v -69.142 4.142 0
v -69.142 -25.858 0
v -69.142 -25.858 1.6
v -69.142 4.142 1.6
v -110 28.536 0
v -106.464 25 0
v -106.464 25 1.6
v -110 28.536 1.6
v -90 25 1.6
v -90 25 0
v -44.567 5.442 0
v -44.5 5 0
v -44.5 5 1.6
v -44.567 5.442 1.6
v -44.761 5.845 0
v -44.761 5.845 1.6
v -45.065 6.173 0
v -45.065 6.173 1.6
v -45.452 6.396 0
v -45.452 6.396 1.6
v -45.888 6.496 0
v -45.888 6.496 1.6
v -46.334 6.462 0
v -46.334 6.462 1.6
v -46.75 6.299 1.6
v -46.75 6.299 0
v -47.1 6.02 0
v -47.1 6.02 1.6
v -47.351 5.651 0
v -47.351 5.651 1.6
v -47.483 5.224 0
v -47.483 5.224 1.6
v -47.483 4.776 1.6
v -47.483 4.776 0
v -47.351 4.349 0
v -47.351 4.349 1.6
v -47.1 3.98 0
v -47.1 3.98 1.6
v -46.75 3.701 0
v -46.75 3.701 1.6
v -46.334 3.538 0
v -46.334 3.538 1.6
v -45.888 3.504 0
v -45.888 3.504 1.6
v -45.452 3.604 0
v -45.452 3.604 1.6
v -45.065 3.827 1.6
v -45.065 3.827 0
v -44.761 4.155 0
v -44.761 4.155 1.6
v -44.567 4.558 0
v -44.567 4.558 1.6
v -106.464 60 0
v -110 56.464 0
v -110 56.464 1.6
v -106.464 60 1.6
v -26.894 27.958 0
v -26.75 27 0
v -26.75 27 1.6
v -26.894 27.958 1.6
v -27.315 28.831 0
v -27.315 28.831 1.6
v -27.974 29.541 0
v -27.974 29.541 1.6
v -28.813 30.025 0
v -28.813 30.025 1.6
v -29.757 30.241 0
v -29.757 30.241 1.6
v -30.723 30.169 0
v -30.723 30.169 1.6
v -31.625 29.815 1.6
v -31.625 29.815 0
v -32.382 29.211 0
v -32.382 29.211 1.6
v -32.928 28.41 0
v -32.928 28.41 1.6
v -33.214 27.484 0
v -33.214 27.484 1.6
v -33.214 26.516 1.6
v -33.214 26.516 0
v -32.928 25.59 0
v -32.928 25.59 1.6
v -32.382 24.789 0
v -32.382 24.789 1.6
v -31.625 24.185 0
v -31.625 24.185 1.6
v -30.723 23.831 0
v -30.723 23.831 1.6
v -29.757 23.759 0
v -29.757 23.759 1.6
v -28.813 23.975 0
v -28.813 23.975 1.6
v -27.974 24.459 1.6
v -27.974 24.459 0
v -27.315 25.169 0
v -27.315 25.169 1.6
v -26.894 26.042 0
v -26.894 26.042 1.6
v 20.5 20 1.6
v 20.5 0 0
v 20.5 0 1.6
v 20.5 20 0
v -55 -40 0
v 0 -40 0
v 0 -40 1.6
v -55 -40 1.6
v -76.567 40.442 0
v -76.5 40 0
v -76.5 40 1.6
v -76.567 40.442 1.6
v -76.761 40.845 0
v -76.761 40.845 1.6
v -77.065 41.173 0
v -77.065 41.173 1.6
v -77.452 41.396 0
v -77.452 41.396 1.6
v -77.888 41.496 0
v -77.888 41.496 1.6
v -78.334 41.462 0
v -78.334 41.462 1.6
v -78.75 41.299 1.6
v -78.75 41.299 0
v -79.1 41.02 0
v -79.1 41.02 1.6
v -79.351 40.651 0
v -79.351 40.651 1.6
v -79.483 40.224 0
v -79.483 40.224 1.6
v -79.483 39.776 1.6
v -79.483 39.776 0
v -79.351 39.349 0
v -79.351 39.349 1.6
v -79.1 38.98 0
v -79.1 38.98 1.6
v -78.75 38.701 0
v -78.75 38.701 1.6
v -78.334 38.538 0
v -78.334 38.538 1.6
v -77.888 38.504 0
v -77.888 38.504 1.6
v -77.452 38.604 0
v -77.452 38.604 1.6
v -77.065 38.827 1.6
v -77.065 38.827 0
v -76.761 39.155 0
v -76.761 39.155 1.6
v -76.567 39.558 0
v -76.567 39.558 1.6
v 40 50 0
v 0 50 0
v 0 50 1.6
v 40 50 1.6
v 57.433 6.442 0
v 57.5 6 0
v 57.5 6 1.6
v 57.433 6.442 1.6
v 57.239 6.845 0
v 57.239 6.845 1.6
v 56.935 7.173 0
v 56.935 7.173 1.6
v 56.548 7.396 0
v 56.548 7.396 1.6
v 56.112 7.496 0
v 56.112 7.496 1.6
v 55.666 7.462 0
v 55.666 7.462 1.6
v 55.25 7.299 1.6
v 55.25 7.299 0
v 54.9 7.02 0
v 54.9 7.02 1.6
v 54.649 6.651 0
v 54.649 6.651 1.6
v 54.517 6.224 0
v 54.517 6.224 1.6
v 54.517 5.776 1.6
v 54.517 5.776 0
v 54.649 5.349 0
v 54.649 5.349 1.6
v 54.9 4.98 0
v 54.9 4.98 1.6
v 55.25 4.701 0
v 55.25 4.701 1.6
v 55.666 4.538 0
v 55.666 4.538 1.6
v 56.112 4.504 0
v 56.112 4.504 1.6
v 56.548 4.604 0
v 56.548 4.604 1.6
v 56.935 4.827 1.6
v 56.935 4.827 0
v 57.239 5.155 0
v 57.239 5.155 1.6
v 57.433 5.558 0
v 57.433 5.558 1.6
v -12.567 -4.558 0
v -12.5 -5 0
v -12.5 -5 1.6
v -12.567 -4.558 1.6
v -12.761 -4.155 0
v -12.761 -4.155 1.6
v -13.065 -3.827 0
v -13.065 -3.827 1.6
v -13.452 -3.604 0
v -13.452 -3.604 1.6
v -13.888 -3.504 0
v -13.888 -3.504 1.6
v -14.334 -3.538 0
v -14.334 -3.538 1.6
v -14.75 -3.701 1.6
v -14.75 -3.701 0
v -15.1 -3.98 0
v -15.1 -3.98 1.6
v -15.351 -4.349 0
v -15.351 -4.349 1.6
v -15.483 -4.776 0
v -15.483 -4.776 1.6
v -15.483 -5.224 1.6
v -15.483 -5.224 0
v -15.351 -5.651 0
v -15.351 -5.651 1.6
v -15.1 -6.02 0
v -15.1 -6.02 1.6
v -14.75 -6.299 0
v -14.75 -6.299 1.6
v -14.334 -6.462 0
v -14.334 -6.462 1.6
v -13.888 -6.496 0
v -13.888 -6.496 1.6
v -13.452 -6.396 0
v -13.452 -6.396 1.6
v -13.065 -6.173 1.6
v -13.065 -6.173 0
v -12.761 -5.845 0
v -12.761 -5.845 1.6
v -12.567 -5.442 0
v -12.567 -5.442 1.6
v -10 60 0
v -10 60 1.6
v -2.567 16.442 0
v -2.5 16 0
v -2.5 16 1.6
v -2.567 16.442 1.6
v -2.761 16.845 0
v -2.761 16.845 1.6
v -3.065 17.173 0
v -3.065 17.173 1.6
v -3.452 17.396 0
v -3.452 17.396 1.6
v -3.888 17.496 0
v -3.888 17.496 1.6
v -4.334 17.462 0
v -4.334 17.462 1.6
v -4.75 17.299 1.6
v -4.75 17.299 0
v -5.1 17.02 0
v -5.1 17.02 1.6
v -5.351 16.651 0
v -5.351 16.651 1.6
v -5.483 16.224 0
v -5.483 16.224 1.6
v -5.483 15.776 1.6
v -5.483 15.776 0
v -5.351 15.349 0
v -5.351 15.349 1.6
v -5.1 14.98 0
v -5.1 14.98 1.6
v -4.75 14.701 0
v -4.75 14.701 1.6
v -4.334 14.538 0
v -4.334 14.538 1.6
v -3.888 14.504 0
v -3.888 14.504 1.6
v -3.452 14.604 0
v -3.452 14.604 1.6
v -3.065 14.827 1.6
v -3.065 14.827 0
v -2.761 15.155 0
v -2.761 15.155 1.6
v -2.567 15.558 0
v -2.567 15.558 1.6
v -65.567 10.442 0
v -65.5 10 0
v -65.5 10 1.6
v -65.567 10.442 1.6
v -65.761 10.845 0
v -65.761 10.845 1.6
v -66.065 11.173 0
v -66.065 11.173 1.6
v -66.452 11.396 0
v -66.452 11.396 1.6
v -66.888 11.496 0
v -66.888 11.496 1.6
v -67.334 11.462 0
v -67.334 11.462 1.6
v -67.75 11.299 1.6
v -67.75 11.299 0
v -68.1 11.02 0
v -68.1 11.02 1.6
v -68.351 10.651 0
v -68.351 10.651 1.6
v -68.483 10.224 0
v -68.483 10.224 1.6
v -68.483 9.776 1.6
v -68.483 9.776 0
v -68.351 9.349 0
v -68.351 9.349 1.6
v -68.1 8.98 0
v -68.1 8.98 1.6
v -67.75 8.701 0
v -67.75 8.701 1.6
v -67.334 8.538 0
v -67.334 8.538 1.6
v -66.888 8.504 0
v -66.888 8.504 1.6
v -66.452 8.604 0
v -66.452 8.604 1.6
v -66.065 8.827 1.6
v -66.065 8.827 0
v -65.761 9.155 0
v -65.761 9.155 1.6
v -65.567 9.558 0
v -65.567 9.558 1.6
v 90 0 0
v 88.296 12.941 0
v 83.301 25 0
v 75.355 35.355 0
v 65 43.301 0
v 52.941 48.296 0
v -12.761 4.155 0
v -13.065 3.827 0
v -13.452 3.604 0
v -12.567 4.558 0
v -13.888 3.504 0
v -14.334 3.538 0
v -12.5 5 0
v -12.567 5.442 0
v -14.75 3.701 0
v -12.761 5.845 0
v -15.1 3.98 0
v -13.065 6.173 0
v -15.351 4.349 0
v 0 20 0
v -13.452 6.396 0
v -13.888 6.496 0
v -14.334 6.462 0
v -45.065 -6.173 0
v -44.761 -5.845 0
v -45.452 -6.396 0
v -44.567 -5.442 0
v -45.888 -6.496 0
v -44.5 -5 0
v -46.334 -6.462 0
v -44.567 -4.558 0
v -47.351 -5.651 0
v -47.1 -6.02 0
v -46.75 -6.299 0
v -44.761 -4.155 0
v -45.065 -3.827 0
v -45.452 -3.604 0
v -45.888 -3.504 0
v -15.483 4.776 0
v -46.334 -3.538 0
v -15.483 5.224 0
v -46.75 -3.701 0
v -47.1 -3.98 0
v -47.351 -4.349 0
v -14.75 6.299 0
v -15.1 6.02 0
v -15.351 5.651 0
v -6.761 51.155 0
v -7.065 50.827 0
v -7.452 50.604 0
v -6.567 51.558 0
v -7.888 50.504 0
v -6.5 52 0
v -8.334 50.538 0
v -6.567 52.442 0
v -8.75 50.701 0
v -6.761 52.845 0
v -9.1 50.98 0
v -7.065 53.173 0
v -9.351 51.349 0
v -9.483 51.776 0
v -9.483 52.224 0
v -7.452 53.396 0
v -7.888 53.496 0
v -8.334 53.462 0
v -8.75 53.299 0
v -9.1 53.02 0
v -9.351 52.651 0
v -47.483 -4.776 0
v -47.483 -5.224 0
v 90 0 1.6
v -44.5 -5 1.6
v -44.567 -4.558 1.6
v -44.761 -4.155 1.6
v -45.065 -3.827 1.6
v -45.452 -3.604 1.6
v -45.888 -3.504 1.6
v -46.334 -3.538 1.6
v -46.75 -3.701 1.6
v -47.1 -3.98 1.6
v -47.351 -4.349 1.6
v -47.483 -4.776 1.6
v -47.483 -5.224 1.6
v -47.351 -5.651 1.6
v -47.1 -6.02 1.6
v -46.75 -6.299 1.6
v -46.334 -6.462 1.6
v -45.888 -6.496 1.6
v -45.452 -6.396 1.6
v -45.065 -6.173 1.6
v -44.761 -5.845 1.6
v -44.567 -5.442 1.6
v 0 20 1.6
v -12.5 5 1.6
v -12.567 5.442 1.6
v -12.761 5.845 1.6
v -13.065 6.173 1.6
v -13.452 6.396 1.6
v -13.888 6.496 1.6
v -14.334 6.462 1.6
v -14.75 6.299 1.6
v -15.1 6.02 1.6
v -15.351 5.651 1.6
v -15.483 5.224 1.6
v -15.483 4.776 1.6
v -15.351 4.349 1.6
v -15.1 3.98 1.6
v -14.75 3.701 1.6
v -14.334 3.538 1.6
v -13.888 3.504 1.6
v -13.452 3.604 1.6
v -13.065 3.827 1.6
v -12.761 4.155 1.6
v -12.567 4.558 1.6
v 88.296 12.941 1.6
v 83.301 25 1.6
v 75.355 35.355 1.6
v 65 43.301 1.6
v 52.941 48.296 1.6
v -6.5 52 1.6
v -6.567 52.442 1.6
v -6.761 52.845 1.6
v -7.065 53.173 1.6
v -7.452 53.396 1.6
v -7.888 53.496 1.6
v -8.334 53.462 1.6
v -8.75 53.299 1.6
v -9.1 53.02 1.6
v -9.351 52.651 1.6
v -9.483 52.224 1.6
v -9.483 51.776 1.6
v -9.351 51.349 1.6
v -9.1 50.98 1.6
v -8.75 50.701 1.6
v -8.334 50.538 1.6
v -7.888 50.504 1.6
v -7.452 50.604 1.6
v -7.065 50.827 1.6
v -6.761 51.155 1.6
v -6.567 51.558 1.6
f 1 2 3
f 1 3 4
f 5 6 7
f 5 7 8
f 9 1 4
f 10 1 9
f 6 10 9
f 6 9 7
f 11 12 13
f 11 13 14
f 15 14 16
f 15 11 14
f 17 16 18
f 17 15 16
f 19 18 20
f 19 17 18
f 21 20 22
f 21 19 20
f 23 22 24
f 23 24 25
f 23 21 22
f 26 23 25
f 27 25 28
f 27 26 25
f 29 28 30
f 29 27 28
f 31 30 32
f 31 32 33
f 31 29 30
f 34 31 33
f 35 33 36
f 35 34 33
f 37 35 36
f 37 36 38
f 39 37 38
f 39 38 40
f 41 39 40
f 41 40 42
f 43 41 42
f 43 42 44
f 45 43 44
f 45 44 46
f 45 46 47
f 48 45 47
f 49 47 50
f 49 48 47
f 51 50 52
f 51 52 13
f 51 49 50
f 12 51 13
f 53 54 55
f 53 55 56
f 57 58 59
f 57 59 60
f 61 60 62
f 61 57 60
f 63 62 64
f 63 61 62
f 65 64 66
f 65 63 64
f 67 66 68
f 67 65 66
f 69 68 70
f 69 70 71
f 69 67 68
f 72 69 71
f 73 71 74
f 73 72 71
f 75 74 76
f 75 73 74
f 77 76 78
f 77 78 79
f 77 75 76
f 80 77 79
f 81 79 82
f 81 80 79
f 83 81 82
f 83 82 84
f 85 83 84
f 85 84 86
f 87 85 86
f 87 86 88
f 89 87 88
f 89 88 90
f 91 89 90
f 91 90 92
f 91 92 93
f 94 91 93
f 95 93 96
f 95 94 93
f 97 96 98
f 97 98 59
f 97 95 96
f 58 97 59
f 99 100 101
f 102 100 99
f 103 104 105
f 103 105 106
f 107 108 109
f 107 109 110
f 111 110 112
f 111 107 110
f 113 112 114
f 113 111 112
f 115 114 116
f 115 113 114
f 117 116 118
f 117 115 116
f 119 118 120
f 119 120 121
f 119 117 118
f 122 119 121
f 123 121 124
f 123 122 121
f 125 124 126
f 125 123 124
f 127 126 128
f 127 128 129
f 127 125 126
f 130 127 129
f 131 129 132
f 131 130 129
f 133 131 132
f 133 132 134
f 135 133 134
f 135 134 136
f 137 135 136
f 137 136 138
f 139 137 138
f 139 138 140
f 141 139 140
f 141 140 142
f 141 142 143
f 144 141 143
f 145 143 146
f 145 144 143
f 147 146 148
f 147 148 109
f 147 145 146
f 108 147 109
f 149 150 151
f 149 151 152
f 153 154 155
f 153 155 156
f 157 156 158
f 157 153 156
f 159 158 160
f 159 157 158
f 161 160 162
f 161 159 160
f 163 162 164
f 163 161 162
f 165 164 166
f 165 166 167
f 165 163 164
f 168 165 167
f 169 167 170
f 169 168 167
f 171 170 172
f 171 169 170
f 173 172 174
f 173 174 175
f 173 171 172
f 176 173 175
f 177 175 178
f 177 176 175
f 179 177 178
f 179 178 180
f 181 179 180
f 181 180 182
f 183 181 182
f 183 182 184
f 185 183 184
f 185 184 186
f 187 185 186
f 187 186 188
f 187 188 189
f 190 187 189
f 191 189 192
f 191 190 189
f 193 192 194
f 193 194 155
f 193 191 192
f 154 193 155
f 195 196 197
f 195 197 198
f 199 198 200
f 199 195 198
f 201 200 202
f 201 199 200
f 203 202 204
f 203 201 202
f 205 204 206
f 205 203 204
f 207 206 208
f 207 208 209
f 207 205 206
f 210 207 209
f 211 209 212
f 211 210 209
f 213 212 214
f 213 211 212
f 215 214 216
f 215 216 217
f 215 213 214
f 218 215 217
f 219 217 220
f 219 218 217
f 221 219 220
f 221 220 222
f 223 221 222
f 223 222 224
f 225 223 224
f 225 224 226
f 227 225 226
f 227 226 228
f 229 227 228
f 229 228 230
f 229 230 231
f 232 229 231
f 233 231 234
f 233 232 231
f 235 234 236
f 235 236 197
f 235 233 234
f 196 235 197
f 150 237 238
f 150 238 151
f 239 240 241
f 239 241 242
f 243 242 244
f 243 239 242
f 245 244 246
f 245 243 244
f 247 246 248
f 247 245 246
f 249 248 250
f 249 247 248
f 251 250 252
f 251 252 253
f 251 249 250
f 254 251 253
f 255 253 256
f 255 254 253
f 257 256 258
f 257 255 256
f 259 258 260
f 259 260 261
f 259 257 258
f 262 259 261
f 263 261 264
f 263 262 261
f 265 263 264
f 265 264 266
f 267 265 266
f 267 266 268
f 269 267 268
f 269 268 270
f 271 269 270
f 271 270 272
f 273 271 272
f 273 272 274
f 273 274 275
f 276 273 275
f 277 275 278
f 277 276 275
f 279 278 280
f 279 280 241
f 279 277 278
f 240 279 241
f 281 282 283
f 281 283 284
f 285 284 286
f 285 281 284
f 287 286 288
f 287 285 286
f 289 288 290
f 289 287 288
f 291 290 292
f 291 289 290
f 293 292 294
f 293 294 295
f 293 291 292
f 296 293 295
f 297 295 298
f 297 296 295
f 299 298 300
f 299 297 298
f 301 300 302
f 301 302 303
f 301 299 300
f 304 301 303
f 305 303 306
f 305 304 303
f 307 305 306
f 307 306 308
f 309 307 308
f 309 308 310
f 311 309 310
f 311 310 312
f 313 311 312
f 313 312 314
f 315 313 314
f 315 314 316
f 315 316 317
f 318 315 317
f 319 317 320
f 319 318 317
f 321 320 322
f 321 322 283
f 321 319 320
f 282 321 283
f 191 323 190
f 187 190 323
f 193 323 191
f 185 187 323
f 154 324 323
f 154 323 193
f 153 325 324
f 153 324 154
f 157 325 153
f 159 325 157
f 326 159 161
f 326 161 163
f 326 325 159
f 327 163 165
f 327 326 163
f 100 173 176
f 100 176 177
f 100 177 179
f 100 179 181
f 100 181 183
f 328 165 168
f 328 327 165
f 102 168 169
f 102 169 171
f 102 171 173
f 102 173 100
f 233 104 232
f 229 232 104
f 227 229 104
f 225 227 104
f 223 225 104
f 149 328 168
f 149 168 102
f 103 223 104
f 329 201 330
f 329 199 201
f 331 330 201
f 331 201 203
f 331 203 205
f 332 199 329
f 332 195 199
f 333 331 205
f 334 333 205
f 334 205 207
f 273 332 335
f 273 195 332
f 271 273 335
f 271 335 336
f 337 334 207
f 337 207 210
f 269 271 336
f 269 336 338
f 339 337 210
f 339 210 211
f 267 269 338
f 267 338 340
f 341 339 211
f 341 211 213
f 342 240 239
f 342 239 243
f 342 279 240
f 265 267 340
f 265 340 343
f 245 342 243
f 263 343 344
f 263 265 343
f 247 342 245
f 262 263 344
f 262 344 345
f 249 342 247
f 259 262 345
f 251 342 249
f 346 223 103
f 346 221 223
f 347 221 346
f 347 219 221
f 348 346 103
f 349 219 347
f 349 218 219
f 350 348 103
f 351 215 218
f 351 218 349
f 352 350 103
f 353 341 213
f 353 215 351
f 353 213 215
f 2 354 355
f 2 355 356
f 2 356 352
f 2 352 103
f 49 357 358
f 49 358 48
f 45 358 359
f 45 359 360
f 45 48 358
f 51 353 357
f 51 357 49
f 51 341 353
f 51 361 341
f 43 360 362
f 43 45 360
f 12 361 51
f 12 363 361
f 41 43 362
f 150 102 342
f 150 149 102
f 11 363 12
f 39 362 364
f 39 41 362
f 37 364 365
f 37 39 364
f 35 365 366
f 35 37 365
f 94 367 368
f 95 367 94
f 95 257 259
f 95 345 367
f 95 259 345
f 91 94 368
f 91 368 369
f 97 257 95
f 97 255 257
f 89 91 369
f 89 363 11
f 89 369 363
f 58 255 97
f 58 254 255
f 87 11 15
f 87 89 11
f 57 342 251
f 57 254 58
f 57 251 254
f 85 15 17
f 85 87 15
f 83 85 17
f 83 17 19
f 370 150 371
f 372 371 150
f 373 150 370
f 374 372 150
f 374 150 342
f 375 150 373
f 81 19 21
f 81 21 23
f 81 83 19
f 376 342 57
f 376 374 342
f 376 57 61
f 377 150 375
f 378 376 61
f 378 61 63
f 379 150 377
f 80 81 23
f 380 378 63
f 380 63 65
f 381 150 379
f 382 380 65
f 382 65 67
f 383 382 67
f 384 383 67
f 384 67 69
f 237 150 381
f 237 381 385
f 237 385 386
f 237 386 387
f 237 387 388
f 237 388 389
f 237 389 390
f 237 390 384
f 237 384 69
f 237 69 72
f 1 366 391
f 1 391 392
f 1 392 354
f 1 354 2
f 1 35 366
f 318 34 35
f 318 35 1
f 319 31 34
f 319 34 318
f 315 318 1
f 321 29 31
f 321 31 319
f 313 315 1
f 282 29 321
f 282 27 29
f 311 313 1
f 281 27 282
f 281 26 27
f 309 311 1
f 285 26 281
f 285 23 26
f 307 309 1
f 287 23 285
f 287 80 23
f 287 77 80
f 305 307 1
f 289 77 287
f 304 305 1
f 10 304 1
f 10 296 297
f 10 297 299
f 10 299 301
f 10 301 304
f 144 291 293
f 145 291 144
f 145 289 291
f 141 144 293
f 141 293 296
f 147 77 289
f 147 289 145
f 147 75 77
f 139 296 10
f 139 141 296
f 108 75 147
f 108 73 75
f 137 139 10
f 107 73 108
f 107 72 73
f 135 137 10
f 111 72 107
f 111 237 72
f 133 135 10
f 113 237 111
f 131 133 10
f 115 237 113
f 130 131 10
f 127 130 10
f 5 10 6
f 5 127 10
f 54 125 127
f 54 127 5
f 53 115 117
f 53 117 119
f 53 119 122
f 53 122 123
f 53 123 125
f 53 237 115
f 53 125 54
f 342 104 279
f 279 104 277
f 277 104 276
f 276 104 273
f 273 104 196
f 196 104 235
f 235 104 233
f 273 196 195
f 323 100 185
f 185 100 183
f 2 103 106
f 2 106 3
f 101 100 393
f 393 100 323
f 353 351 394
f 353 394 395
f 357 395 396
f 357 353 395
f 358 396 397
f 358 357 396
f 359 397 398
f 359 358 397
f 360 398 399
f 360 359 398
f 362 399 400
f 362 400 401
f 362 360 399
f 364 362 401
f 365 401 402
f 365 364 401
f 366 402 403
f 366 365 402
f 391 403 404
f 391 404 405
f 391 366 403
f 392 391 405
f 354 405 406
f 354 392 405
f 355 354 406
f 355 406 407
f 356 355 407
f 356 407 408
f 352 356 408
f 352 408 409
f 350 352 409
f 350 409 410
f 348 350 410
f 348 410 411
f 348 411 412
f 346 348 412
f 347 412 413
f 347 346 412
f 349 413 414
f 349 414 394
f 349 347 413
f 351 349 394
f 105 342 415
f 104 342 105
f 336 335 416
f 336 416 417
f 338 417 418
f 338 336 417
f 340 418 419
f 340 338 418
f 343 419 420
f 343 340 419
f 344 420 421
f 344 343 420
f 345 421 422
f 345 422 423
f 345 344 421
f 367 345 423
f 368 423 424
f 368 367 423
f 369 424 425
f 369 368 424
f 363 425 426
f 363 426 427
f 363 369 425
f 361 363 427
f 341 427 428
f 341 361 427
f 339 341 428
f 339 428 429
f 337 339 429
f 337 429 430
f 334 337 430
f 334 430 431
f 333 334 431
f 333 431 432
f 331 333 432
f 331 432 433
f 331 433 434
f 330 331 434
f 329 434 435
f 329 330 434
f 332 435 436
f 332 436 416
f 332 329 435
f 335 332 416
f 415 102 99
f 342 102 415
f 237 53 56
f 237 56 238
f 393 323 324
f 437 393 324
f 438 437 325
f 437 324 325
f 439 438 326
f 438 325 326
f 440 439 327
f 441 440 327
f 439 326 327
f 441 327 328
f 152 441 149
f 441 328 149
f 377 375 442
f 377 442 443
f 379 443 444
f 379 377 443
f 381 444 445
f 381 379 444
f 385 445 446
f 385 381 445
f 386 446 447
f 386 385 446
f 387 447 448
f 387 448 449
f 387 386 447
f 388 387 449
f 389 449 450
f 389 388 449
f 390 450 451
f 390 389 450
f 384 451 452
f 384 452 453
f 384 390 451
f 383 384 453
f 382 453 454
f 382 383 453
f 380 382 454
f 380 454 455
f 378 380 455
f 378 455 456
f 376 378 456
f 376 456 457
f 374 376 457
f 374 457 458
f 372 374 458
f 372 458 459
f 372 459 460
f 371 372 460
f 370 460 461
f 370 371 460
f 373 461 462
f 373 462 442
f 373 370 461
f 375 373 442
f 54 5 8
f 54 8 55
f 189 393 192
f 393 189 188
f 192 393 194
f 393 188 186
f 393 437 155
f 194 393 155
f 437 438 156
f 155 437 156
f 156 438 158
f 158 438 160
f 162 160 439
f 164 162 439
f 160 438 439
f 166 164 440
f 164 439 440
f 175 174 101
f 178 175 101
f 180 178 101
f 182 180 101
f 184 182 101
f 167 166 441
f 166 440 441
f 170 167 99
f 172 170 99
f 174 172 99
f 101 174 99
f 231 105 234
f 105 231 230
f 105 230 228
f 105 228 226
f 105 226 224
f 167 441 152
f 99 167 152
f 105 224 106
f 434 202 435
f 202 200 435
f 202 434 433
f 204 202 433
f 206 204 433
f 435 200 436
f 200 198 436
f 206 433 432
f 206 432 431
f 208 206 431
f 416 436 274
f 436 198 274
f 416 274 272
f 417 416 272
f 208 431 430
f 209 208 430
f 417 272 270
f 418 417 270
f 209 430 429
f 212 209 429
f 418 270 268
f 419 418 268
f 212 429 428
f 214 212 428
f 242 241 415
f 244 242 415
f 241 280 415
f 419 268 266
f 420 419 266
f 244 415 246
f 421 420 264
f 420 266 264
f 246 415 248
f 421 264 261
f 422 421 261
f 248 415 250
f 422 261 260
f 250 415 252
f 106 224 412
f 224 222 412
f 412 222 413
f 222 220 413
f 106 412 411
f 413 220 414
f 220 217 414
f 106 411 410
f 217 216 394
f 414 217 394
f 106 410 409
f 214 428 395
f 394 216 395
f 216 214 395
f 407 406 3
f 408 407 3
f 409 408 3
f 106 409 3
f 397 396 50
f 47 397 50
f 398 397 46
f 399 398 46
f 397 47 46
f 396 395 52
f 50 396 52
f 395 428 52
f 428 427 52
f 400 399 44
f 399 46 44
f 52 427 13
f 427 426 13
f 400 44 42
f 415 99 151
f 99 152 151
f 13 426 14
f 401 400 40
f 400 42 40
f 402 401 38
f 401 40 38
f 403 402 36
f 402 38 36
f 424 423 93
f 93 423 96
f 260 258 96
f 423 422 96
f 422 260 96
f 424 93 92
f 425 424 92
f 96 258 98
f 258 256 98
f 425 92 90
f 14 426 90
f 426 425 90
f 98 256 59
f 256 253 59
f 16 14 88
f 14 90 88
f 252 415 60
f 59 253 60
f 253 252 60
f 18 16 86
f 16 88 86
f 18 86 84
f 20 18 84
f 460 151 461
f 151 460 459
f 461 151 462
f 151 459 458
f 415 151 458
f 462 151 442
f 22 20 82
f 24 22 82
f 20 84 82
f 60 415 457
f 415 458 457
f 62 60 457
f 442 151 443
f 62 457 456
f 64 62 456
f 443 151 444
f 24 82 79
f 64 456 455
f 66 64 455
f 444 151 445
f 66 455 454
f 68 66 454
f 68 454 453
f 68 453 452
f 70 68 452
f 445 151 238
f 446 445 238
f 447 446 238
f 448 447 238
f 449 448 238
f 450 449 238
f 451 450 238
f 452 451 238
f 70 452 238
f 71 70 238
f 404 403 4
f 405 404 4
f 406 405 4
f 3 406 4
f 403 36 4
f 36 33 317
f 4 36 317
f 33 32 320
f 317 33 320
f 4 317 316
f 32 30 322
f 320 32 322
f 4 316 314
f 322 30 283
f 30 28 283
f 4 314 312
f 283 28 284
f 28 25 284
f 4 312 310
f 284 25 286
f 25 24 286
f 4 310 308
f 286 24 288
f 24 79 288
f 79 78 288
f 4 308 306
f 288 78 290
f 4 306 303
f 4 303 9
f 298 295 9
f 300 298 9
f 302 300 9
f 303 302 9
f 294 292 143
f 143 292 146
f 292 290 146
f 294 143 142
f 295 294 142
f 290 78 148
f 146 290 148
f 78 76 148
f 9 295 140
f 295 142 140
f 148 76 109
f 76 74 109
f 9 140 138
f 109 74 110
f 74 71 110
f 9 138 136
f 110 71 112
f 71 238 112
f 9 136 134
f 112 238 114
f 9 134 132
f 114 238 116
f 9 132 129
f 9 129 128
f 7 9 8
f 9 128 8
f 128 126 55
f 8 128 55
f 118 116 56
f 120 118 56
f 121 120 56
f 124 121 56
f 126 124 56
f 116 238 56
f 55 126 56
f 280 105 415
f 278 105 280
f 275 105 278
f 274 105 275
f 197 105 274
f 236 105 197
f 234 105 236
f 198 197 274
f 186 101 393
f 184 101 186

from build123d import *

# Parameters (mm, degrees)
SKETCH_R   = 1.5
SKETCH_R_2 = 3.25
PAD_DEPTH  = 1.6


with BuildPart() as part:
    # Sketch → Pad (new body)
    with BuildSketch(Plane.XY):
        with BuildLine():
            Line((20.5, 0), (20.5, 20))
            Line((20.5, 20), (0, 20))
            Line((0, 20), (0, -40))
            Line((0, -40), (-55, -40))
            Line((-55, -40), (-69.142136, -25.857864))
            Line((-69.142136, -25.857864), (-69.142136, 4.142136))
            Line((-69.142136, 4.142136), (-90, 25))
            Line((-90, 25), (-106.464466, 25))
            Line((-106.464466, 25), (-110, 28.535534))
            Line((-110, 28.535534), (-110, 56.464466))
            Line((-110, 56.464466), (-106.464466, 60))
            Line((-106.464466, 60), (-10, 60))
            Line((-10, 60), (0, 50))
            Line((0, 50), (40, 50))
            ThreePointArc((90, 0), (75.355339, 35.355339), (40, 50))
            Line((20.5, 0), (90, 0))
        make_face()
        with Locations((56, 6)):
            Circle(SKETCH_R, mode=Mode.SUBTRACT)
        with Locations((-8, 52)):
            Circle(SKETCH_R, mode=Mode.SUBTRACT)
        with Locations((-78, 40)):
            Circle(SKETCH_R, mode=Mode.SUBTRACT)
        with Locations((-4, 16)):
            Circle(SKETCH_R, mode=Mode.SUBTRACT)
        with Locations((-67, 10)):
            Circle(SKETCH_R, mode=Mode.SUBTRACT)
        with Locations((-30, 27)):
            Circle(SKETCH_R_2, mode=Mode.SUBTRACT)
        with Locations((-46, 5)):
            Circle(SKETCH_R, mode=Mode.SUBTRACT)
        with Locations((-14, 5)):
            Circle(SKETCH_R, mode=Mode.SUBTRACT)
        with Locations((-14, -5)):
            Circle(SKETCH_R, mode=Mode.SUBTRACT)
        with Locations((-46, -5)):
            Circle(SKETCH_R, mode=Mode.SUBTRACT)
    extrude(amount=PAD_DEPTH)


solid = part.part
